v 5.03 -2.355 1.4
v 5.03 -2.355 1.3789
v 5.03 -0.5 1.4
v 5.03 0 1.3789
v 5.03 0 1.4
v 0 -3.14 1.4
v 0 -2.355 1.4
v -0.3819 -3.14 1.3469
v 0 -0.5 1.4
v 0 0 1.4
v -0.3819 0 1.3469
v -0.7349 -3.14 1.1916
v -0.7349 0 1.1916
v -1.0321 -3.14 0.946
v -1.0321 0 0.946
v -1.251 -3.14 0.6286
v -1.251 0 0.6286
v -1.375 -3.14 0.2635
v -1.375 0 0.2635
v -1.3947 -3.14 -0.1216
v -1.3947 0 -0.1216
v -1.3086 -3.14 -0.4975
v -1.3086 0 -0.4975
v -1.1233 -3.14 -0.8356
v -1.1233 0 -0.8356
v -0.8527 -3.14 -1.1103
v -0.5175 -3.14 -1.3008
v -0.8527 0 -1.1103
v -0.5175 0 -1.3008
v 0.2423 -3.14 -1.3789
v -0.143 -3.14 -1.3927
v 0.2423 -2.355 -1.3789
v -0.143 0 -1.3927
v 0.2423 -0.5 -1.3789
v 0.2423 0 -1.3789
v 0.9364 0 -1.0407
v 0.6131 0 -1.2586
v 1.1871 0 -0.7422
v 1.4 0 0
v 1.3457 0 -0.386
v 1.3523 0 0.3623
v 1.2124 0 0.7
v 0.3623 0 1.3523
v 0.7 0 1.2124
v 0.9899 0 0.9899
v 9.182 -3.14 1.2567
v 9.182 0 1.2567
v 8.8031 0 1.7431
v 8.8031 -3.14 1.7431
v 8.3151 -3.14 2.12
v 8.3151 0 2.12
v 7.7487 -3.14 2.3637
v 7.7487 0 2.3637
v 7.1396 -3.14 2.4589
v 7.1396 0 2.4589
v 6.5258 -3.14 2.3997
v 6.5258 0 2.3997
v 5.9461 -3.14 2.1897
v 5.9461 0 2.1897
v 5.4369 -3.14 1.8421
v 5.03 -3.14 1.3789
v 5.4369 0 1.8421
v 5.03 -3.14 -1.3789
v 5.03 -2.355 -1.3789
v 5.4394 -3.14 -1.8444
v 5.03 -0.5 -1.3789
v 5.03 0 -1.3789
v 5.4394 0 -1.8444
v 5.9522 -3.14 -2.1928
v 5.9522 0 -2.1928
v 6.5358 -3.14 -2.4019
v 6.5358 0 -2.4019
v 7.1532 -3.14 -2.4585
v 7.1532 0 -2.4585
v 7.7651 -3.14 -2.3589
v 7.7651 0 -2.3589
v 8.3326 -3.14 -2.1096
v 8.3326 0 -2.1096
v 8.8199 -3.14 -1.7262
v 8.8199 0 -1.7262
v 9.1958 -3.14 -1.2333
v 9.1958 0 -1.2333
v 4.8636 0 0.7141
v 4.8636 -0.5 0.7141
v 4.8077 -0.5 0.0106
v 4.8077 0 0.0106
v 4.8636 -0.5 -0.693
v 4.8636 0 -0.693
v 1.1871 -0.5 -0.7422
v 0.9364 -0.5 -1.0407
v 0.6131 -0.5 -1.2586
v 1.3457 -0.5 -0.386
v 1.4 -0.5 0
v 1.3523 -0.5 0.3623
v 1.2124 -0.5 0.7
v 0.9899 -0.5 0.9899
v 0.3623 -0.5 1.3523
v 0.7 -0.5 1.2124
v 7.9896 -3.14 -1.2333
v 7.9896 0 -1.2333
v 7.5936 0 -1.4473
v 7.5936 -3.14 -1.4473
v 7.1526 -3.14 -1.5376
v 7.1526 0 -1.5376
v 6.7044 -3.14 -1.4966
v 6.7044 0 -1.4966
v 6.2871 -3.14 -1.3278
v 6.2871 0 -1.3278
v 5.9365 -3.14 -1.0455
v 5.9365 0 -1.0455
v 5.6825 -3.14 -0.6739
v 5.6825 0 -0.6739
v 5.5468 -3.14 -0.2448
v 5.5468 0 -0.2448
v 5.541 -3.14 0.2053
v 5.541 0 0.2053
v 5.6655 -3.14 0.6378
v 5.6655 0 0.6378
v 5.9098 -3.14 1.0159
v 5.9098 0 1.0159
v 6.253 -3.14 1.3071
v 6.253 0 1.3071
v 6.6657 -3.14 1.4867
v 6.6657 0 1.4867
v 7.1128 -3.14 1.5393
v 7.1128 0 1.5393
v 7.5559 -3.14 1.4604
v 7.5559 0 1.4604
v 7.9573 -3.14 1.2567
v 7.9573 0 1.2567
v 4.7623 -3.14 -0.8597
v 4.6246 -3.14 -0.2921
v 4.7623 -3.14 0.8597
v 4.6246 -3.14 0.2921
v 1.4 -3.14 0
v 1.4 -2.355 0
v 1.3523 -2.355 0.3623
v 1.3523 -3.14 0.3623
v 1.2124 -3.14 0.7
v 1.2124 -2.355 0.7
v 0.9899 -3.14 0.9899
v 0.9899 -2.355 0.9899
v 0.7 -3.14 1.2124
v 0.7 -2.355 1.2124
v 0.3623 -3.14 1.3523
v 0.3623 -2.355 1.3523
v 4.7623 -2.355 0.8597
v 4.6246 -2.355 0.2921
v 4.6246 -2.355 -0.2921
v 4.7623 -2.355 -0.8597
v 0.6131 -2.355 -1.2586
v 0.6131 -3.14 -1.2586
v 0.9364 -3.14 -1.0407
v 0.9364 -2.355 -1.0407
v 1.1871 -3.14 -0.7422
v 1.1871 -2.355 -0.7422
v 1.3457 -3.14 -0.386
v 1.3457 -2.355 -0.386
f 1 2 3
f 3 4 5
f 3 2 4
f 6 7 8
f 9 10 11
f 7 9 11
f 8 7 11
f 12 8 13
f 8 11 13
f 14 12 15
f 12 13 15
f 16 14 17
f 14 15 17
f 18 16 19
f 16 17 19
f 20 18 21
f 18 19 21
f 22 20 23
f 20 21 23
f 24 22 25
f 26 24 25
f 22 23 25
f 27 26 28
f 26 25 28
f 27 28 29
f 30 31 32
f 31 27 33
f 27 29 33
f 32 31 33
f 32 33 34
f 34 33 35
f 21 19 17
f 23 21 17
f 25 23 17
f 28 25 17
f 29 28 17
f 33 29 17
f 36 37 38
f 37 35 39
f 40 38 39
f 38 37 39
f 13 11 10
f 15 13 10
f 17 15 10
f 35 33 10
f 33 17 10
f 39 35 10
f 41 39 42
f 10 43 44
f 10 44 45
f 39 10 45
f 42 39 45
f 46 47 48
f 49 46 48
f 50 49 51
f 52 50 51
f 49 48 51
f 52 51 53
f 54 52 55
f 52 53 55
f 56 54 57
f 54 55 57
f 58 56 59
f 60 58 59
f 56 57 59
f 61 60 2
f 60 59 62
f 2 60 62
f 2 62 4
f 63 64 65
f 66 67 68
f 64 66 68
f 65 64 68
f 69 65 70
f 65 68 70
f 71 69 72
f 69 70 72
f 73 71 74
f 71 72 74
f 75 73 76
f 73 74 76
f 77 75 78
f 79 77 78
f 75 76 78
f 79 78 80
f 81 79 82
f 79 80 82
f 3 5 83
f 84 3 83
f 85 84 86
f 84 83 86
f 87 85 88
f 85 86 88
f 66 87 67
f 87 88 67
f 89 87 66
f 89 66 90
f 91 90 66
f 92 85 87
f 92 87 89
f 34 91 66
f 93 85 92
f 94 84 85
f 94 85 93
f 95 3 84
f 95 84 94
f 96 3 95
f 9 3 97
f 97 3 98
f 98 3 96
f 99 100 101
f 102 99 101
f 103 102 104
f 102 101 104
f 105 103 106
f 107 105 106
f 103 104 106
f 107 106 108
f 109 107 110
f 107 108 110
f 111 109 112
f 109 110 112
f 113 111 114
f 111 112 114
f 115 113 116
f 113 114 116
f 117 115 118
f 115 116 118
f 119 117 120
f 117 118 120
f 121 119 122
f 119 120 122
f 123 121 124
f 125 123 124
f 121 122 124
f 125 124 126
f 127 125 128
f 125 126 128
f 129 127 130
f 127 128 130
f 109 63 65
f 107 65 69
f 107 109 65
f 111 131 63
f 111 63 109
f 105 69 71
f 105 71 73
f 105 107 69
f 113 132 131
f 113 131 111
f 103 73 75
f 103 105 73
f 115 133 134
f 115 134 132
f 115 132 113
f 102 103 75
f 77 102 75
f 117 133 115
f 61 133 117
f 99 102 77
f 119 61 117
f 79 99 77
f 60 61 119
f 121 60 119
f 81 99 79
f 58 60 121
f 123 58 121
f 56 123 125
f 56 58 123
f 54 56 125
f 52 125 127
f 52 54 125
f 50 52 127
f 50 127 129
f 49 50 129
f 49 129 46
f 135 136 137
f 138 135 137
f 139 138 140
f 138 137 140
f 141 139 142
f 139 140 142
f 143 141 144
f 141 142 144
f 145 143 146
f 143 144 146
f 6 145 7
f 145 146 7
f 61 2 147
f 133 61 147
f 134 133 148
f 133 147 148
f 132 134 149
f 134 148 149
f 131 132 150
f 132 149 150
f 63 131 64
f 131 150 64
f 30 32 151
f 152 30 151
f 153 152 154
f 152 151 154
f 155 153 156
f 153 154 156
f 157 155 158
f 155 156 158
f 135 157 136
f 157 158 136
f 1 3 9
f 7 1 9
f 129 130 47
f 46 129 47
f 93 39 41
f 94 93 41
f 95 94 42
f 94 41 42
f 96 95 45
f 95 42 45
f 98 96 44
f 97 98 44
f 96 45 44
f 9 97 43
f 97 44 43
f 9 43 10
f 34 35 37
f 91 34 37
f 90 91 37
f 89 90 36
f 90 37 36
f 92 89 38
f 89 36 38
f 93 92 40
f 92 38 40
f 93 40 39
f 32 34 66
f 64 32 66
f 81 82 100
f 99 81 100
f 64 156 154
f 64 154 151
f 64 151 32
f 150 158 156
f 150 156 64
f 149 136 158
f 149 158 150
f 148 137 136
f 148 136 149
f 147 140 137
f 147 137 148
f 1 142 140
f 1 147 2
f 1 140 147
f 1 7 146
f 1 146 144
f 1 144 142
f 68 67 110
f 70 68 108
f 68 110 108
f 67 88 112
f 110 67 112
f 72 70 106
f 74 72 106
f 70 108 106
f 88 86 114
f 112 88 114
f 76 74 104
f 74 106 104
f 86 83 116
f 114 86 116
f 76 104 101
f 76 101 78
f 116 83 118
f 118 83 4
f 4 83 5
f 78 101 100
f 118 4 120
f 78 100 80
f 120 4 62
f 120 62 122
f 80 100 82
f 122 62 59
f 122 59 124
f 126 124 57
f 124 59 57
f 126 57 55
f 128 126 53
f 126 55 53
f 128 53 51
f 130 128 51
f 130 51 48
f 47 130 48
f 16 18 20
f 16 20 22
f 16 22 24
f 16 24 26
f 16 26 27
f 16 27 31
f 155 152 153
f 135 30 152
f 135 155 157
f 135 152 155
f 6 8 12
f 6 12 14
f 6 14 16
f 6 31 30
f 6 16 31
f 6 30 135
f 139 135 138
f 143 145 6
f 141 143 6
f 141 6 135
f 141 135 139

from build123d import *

# Parameters (mm, degrees)
F1_DEPTH = 1.57
F2_DEPTH = 3.14
F4_DEPTH = 0.5
F5_DEPTH = 3.14
F6_DEPTH = 0.785


with BuildPart() as f1:
    # F0 (on Front) → F1 (new body)
    with BuildSketch(Plane.XZ):
        with BuildLine():
            ThreePointArc((0, 1.4), (0.9899494937, 0.9899494937), (1.4, 0))
            ThreePointArc((1.4, 0), (1.0722010752, -0.9002137826), (0.2423073508, -1.3788716937))
            Line((0.2423073508, -1.3788716937), (5.03, -1.3788716937))
            ThreePointArc((5.03, -1.3788716937), (4.6072316639, 0), (5.03, 1.3788716937))
            Line((5.03, 1.3788716937), (5.03, 1.4))
            Line((5.03, 1.4), (0, 1.4))
        make_face()
    extrude(amount=F1_DEPTH)

    # F0 (on Front) → F2 (join)
    with BuildSketch(Plane.XZ):
        with BuildLine():
            ThreePointArc((5.03, 1.3788716937), (4.6072316639, 0), (5.03, -1.3788716937))
            ThreePointArc((5.03, -1.3788716937), (7.1531686939, -2.4584984903), (9.1957705087, -1.2332568208))
            Line((9.1957705087, -1.2332568208), (7.9895535242, -1.2332568208))
            ThreePointArc((7.9895535242, -1.2332568208), (5.5273609556, -0.0199549945), (7.9572859214, 1.2567431792))
            Line((7.9572859214, 1.2567431792), (9.1819885249, 1.2567431792))
            ThreePointArc((9.1819885249, 1.2567431792), (7.139559961, 2.458936481), (5.03, 1.3788716937))
        make_face()
    extrude(amount=F2_DEPTH)

    # F3 (on face) → F4 (cut)
    with BuildSketch(Plane(origin=(0, 0, 0), x_dir=(-1, 0, 0), z_dir=(0, 1, 0))):
        with BuildLine():
            ThreePointArc((-5.03, 1.4), (-4.8076942376, 0.0105641531), (-5.03, -1.3788716937))
            Line((-5.03, -1.3788716937), (-0.2423073508, -1.3788716937))
            ThreePointArc((-0.2423073508, -1.3788716937), (-1.3947079213, 0.1216133808), (0, 1.4))
            Line((0, 1.4), (-5.03, 1.4))
        make_face()
    extrude(amount=-F4_DEPTH, mode=Mode.SUBTRACT)

    # F0 (on Front) → F5 (join)
    with BuildSketch(Plane.XZ):
        with BuildLine():
            ThreePointArc((0.2423073508, -1.3788716937), (1.0722010752, -0.9002137826), (1.4, 0))
            ThreePointArc((1.4, 0), (0.9899494937, 0.9899494937), (0, 1.4))
            ThreePointArc((0, 1.4), (-1.3947079213, -0.1216133808), (0.2423073508, -1.3788716937))
        make_face()
    extrude(amount=F5_DEPTH)

    # F6 (add): a face of the model
    f6_faces = [f1.faces().sort_by_distance(p)[0] for p in [
        (2.9154968292, -1.57, 0.0141355812),
    ]]
    extrude(f6_faces, amount=F6_DEPTH)


solid = f1.part
